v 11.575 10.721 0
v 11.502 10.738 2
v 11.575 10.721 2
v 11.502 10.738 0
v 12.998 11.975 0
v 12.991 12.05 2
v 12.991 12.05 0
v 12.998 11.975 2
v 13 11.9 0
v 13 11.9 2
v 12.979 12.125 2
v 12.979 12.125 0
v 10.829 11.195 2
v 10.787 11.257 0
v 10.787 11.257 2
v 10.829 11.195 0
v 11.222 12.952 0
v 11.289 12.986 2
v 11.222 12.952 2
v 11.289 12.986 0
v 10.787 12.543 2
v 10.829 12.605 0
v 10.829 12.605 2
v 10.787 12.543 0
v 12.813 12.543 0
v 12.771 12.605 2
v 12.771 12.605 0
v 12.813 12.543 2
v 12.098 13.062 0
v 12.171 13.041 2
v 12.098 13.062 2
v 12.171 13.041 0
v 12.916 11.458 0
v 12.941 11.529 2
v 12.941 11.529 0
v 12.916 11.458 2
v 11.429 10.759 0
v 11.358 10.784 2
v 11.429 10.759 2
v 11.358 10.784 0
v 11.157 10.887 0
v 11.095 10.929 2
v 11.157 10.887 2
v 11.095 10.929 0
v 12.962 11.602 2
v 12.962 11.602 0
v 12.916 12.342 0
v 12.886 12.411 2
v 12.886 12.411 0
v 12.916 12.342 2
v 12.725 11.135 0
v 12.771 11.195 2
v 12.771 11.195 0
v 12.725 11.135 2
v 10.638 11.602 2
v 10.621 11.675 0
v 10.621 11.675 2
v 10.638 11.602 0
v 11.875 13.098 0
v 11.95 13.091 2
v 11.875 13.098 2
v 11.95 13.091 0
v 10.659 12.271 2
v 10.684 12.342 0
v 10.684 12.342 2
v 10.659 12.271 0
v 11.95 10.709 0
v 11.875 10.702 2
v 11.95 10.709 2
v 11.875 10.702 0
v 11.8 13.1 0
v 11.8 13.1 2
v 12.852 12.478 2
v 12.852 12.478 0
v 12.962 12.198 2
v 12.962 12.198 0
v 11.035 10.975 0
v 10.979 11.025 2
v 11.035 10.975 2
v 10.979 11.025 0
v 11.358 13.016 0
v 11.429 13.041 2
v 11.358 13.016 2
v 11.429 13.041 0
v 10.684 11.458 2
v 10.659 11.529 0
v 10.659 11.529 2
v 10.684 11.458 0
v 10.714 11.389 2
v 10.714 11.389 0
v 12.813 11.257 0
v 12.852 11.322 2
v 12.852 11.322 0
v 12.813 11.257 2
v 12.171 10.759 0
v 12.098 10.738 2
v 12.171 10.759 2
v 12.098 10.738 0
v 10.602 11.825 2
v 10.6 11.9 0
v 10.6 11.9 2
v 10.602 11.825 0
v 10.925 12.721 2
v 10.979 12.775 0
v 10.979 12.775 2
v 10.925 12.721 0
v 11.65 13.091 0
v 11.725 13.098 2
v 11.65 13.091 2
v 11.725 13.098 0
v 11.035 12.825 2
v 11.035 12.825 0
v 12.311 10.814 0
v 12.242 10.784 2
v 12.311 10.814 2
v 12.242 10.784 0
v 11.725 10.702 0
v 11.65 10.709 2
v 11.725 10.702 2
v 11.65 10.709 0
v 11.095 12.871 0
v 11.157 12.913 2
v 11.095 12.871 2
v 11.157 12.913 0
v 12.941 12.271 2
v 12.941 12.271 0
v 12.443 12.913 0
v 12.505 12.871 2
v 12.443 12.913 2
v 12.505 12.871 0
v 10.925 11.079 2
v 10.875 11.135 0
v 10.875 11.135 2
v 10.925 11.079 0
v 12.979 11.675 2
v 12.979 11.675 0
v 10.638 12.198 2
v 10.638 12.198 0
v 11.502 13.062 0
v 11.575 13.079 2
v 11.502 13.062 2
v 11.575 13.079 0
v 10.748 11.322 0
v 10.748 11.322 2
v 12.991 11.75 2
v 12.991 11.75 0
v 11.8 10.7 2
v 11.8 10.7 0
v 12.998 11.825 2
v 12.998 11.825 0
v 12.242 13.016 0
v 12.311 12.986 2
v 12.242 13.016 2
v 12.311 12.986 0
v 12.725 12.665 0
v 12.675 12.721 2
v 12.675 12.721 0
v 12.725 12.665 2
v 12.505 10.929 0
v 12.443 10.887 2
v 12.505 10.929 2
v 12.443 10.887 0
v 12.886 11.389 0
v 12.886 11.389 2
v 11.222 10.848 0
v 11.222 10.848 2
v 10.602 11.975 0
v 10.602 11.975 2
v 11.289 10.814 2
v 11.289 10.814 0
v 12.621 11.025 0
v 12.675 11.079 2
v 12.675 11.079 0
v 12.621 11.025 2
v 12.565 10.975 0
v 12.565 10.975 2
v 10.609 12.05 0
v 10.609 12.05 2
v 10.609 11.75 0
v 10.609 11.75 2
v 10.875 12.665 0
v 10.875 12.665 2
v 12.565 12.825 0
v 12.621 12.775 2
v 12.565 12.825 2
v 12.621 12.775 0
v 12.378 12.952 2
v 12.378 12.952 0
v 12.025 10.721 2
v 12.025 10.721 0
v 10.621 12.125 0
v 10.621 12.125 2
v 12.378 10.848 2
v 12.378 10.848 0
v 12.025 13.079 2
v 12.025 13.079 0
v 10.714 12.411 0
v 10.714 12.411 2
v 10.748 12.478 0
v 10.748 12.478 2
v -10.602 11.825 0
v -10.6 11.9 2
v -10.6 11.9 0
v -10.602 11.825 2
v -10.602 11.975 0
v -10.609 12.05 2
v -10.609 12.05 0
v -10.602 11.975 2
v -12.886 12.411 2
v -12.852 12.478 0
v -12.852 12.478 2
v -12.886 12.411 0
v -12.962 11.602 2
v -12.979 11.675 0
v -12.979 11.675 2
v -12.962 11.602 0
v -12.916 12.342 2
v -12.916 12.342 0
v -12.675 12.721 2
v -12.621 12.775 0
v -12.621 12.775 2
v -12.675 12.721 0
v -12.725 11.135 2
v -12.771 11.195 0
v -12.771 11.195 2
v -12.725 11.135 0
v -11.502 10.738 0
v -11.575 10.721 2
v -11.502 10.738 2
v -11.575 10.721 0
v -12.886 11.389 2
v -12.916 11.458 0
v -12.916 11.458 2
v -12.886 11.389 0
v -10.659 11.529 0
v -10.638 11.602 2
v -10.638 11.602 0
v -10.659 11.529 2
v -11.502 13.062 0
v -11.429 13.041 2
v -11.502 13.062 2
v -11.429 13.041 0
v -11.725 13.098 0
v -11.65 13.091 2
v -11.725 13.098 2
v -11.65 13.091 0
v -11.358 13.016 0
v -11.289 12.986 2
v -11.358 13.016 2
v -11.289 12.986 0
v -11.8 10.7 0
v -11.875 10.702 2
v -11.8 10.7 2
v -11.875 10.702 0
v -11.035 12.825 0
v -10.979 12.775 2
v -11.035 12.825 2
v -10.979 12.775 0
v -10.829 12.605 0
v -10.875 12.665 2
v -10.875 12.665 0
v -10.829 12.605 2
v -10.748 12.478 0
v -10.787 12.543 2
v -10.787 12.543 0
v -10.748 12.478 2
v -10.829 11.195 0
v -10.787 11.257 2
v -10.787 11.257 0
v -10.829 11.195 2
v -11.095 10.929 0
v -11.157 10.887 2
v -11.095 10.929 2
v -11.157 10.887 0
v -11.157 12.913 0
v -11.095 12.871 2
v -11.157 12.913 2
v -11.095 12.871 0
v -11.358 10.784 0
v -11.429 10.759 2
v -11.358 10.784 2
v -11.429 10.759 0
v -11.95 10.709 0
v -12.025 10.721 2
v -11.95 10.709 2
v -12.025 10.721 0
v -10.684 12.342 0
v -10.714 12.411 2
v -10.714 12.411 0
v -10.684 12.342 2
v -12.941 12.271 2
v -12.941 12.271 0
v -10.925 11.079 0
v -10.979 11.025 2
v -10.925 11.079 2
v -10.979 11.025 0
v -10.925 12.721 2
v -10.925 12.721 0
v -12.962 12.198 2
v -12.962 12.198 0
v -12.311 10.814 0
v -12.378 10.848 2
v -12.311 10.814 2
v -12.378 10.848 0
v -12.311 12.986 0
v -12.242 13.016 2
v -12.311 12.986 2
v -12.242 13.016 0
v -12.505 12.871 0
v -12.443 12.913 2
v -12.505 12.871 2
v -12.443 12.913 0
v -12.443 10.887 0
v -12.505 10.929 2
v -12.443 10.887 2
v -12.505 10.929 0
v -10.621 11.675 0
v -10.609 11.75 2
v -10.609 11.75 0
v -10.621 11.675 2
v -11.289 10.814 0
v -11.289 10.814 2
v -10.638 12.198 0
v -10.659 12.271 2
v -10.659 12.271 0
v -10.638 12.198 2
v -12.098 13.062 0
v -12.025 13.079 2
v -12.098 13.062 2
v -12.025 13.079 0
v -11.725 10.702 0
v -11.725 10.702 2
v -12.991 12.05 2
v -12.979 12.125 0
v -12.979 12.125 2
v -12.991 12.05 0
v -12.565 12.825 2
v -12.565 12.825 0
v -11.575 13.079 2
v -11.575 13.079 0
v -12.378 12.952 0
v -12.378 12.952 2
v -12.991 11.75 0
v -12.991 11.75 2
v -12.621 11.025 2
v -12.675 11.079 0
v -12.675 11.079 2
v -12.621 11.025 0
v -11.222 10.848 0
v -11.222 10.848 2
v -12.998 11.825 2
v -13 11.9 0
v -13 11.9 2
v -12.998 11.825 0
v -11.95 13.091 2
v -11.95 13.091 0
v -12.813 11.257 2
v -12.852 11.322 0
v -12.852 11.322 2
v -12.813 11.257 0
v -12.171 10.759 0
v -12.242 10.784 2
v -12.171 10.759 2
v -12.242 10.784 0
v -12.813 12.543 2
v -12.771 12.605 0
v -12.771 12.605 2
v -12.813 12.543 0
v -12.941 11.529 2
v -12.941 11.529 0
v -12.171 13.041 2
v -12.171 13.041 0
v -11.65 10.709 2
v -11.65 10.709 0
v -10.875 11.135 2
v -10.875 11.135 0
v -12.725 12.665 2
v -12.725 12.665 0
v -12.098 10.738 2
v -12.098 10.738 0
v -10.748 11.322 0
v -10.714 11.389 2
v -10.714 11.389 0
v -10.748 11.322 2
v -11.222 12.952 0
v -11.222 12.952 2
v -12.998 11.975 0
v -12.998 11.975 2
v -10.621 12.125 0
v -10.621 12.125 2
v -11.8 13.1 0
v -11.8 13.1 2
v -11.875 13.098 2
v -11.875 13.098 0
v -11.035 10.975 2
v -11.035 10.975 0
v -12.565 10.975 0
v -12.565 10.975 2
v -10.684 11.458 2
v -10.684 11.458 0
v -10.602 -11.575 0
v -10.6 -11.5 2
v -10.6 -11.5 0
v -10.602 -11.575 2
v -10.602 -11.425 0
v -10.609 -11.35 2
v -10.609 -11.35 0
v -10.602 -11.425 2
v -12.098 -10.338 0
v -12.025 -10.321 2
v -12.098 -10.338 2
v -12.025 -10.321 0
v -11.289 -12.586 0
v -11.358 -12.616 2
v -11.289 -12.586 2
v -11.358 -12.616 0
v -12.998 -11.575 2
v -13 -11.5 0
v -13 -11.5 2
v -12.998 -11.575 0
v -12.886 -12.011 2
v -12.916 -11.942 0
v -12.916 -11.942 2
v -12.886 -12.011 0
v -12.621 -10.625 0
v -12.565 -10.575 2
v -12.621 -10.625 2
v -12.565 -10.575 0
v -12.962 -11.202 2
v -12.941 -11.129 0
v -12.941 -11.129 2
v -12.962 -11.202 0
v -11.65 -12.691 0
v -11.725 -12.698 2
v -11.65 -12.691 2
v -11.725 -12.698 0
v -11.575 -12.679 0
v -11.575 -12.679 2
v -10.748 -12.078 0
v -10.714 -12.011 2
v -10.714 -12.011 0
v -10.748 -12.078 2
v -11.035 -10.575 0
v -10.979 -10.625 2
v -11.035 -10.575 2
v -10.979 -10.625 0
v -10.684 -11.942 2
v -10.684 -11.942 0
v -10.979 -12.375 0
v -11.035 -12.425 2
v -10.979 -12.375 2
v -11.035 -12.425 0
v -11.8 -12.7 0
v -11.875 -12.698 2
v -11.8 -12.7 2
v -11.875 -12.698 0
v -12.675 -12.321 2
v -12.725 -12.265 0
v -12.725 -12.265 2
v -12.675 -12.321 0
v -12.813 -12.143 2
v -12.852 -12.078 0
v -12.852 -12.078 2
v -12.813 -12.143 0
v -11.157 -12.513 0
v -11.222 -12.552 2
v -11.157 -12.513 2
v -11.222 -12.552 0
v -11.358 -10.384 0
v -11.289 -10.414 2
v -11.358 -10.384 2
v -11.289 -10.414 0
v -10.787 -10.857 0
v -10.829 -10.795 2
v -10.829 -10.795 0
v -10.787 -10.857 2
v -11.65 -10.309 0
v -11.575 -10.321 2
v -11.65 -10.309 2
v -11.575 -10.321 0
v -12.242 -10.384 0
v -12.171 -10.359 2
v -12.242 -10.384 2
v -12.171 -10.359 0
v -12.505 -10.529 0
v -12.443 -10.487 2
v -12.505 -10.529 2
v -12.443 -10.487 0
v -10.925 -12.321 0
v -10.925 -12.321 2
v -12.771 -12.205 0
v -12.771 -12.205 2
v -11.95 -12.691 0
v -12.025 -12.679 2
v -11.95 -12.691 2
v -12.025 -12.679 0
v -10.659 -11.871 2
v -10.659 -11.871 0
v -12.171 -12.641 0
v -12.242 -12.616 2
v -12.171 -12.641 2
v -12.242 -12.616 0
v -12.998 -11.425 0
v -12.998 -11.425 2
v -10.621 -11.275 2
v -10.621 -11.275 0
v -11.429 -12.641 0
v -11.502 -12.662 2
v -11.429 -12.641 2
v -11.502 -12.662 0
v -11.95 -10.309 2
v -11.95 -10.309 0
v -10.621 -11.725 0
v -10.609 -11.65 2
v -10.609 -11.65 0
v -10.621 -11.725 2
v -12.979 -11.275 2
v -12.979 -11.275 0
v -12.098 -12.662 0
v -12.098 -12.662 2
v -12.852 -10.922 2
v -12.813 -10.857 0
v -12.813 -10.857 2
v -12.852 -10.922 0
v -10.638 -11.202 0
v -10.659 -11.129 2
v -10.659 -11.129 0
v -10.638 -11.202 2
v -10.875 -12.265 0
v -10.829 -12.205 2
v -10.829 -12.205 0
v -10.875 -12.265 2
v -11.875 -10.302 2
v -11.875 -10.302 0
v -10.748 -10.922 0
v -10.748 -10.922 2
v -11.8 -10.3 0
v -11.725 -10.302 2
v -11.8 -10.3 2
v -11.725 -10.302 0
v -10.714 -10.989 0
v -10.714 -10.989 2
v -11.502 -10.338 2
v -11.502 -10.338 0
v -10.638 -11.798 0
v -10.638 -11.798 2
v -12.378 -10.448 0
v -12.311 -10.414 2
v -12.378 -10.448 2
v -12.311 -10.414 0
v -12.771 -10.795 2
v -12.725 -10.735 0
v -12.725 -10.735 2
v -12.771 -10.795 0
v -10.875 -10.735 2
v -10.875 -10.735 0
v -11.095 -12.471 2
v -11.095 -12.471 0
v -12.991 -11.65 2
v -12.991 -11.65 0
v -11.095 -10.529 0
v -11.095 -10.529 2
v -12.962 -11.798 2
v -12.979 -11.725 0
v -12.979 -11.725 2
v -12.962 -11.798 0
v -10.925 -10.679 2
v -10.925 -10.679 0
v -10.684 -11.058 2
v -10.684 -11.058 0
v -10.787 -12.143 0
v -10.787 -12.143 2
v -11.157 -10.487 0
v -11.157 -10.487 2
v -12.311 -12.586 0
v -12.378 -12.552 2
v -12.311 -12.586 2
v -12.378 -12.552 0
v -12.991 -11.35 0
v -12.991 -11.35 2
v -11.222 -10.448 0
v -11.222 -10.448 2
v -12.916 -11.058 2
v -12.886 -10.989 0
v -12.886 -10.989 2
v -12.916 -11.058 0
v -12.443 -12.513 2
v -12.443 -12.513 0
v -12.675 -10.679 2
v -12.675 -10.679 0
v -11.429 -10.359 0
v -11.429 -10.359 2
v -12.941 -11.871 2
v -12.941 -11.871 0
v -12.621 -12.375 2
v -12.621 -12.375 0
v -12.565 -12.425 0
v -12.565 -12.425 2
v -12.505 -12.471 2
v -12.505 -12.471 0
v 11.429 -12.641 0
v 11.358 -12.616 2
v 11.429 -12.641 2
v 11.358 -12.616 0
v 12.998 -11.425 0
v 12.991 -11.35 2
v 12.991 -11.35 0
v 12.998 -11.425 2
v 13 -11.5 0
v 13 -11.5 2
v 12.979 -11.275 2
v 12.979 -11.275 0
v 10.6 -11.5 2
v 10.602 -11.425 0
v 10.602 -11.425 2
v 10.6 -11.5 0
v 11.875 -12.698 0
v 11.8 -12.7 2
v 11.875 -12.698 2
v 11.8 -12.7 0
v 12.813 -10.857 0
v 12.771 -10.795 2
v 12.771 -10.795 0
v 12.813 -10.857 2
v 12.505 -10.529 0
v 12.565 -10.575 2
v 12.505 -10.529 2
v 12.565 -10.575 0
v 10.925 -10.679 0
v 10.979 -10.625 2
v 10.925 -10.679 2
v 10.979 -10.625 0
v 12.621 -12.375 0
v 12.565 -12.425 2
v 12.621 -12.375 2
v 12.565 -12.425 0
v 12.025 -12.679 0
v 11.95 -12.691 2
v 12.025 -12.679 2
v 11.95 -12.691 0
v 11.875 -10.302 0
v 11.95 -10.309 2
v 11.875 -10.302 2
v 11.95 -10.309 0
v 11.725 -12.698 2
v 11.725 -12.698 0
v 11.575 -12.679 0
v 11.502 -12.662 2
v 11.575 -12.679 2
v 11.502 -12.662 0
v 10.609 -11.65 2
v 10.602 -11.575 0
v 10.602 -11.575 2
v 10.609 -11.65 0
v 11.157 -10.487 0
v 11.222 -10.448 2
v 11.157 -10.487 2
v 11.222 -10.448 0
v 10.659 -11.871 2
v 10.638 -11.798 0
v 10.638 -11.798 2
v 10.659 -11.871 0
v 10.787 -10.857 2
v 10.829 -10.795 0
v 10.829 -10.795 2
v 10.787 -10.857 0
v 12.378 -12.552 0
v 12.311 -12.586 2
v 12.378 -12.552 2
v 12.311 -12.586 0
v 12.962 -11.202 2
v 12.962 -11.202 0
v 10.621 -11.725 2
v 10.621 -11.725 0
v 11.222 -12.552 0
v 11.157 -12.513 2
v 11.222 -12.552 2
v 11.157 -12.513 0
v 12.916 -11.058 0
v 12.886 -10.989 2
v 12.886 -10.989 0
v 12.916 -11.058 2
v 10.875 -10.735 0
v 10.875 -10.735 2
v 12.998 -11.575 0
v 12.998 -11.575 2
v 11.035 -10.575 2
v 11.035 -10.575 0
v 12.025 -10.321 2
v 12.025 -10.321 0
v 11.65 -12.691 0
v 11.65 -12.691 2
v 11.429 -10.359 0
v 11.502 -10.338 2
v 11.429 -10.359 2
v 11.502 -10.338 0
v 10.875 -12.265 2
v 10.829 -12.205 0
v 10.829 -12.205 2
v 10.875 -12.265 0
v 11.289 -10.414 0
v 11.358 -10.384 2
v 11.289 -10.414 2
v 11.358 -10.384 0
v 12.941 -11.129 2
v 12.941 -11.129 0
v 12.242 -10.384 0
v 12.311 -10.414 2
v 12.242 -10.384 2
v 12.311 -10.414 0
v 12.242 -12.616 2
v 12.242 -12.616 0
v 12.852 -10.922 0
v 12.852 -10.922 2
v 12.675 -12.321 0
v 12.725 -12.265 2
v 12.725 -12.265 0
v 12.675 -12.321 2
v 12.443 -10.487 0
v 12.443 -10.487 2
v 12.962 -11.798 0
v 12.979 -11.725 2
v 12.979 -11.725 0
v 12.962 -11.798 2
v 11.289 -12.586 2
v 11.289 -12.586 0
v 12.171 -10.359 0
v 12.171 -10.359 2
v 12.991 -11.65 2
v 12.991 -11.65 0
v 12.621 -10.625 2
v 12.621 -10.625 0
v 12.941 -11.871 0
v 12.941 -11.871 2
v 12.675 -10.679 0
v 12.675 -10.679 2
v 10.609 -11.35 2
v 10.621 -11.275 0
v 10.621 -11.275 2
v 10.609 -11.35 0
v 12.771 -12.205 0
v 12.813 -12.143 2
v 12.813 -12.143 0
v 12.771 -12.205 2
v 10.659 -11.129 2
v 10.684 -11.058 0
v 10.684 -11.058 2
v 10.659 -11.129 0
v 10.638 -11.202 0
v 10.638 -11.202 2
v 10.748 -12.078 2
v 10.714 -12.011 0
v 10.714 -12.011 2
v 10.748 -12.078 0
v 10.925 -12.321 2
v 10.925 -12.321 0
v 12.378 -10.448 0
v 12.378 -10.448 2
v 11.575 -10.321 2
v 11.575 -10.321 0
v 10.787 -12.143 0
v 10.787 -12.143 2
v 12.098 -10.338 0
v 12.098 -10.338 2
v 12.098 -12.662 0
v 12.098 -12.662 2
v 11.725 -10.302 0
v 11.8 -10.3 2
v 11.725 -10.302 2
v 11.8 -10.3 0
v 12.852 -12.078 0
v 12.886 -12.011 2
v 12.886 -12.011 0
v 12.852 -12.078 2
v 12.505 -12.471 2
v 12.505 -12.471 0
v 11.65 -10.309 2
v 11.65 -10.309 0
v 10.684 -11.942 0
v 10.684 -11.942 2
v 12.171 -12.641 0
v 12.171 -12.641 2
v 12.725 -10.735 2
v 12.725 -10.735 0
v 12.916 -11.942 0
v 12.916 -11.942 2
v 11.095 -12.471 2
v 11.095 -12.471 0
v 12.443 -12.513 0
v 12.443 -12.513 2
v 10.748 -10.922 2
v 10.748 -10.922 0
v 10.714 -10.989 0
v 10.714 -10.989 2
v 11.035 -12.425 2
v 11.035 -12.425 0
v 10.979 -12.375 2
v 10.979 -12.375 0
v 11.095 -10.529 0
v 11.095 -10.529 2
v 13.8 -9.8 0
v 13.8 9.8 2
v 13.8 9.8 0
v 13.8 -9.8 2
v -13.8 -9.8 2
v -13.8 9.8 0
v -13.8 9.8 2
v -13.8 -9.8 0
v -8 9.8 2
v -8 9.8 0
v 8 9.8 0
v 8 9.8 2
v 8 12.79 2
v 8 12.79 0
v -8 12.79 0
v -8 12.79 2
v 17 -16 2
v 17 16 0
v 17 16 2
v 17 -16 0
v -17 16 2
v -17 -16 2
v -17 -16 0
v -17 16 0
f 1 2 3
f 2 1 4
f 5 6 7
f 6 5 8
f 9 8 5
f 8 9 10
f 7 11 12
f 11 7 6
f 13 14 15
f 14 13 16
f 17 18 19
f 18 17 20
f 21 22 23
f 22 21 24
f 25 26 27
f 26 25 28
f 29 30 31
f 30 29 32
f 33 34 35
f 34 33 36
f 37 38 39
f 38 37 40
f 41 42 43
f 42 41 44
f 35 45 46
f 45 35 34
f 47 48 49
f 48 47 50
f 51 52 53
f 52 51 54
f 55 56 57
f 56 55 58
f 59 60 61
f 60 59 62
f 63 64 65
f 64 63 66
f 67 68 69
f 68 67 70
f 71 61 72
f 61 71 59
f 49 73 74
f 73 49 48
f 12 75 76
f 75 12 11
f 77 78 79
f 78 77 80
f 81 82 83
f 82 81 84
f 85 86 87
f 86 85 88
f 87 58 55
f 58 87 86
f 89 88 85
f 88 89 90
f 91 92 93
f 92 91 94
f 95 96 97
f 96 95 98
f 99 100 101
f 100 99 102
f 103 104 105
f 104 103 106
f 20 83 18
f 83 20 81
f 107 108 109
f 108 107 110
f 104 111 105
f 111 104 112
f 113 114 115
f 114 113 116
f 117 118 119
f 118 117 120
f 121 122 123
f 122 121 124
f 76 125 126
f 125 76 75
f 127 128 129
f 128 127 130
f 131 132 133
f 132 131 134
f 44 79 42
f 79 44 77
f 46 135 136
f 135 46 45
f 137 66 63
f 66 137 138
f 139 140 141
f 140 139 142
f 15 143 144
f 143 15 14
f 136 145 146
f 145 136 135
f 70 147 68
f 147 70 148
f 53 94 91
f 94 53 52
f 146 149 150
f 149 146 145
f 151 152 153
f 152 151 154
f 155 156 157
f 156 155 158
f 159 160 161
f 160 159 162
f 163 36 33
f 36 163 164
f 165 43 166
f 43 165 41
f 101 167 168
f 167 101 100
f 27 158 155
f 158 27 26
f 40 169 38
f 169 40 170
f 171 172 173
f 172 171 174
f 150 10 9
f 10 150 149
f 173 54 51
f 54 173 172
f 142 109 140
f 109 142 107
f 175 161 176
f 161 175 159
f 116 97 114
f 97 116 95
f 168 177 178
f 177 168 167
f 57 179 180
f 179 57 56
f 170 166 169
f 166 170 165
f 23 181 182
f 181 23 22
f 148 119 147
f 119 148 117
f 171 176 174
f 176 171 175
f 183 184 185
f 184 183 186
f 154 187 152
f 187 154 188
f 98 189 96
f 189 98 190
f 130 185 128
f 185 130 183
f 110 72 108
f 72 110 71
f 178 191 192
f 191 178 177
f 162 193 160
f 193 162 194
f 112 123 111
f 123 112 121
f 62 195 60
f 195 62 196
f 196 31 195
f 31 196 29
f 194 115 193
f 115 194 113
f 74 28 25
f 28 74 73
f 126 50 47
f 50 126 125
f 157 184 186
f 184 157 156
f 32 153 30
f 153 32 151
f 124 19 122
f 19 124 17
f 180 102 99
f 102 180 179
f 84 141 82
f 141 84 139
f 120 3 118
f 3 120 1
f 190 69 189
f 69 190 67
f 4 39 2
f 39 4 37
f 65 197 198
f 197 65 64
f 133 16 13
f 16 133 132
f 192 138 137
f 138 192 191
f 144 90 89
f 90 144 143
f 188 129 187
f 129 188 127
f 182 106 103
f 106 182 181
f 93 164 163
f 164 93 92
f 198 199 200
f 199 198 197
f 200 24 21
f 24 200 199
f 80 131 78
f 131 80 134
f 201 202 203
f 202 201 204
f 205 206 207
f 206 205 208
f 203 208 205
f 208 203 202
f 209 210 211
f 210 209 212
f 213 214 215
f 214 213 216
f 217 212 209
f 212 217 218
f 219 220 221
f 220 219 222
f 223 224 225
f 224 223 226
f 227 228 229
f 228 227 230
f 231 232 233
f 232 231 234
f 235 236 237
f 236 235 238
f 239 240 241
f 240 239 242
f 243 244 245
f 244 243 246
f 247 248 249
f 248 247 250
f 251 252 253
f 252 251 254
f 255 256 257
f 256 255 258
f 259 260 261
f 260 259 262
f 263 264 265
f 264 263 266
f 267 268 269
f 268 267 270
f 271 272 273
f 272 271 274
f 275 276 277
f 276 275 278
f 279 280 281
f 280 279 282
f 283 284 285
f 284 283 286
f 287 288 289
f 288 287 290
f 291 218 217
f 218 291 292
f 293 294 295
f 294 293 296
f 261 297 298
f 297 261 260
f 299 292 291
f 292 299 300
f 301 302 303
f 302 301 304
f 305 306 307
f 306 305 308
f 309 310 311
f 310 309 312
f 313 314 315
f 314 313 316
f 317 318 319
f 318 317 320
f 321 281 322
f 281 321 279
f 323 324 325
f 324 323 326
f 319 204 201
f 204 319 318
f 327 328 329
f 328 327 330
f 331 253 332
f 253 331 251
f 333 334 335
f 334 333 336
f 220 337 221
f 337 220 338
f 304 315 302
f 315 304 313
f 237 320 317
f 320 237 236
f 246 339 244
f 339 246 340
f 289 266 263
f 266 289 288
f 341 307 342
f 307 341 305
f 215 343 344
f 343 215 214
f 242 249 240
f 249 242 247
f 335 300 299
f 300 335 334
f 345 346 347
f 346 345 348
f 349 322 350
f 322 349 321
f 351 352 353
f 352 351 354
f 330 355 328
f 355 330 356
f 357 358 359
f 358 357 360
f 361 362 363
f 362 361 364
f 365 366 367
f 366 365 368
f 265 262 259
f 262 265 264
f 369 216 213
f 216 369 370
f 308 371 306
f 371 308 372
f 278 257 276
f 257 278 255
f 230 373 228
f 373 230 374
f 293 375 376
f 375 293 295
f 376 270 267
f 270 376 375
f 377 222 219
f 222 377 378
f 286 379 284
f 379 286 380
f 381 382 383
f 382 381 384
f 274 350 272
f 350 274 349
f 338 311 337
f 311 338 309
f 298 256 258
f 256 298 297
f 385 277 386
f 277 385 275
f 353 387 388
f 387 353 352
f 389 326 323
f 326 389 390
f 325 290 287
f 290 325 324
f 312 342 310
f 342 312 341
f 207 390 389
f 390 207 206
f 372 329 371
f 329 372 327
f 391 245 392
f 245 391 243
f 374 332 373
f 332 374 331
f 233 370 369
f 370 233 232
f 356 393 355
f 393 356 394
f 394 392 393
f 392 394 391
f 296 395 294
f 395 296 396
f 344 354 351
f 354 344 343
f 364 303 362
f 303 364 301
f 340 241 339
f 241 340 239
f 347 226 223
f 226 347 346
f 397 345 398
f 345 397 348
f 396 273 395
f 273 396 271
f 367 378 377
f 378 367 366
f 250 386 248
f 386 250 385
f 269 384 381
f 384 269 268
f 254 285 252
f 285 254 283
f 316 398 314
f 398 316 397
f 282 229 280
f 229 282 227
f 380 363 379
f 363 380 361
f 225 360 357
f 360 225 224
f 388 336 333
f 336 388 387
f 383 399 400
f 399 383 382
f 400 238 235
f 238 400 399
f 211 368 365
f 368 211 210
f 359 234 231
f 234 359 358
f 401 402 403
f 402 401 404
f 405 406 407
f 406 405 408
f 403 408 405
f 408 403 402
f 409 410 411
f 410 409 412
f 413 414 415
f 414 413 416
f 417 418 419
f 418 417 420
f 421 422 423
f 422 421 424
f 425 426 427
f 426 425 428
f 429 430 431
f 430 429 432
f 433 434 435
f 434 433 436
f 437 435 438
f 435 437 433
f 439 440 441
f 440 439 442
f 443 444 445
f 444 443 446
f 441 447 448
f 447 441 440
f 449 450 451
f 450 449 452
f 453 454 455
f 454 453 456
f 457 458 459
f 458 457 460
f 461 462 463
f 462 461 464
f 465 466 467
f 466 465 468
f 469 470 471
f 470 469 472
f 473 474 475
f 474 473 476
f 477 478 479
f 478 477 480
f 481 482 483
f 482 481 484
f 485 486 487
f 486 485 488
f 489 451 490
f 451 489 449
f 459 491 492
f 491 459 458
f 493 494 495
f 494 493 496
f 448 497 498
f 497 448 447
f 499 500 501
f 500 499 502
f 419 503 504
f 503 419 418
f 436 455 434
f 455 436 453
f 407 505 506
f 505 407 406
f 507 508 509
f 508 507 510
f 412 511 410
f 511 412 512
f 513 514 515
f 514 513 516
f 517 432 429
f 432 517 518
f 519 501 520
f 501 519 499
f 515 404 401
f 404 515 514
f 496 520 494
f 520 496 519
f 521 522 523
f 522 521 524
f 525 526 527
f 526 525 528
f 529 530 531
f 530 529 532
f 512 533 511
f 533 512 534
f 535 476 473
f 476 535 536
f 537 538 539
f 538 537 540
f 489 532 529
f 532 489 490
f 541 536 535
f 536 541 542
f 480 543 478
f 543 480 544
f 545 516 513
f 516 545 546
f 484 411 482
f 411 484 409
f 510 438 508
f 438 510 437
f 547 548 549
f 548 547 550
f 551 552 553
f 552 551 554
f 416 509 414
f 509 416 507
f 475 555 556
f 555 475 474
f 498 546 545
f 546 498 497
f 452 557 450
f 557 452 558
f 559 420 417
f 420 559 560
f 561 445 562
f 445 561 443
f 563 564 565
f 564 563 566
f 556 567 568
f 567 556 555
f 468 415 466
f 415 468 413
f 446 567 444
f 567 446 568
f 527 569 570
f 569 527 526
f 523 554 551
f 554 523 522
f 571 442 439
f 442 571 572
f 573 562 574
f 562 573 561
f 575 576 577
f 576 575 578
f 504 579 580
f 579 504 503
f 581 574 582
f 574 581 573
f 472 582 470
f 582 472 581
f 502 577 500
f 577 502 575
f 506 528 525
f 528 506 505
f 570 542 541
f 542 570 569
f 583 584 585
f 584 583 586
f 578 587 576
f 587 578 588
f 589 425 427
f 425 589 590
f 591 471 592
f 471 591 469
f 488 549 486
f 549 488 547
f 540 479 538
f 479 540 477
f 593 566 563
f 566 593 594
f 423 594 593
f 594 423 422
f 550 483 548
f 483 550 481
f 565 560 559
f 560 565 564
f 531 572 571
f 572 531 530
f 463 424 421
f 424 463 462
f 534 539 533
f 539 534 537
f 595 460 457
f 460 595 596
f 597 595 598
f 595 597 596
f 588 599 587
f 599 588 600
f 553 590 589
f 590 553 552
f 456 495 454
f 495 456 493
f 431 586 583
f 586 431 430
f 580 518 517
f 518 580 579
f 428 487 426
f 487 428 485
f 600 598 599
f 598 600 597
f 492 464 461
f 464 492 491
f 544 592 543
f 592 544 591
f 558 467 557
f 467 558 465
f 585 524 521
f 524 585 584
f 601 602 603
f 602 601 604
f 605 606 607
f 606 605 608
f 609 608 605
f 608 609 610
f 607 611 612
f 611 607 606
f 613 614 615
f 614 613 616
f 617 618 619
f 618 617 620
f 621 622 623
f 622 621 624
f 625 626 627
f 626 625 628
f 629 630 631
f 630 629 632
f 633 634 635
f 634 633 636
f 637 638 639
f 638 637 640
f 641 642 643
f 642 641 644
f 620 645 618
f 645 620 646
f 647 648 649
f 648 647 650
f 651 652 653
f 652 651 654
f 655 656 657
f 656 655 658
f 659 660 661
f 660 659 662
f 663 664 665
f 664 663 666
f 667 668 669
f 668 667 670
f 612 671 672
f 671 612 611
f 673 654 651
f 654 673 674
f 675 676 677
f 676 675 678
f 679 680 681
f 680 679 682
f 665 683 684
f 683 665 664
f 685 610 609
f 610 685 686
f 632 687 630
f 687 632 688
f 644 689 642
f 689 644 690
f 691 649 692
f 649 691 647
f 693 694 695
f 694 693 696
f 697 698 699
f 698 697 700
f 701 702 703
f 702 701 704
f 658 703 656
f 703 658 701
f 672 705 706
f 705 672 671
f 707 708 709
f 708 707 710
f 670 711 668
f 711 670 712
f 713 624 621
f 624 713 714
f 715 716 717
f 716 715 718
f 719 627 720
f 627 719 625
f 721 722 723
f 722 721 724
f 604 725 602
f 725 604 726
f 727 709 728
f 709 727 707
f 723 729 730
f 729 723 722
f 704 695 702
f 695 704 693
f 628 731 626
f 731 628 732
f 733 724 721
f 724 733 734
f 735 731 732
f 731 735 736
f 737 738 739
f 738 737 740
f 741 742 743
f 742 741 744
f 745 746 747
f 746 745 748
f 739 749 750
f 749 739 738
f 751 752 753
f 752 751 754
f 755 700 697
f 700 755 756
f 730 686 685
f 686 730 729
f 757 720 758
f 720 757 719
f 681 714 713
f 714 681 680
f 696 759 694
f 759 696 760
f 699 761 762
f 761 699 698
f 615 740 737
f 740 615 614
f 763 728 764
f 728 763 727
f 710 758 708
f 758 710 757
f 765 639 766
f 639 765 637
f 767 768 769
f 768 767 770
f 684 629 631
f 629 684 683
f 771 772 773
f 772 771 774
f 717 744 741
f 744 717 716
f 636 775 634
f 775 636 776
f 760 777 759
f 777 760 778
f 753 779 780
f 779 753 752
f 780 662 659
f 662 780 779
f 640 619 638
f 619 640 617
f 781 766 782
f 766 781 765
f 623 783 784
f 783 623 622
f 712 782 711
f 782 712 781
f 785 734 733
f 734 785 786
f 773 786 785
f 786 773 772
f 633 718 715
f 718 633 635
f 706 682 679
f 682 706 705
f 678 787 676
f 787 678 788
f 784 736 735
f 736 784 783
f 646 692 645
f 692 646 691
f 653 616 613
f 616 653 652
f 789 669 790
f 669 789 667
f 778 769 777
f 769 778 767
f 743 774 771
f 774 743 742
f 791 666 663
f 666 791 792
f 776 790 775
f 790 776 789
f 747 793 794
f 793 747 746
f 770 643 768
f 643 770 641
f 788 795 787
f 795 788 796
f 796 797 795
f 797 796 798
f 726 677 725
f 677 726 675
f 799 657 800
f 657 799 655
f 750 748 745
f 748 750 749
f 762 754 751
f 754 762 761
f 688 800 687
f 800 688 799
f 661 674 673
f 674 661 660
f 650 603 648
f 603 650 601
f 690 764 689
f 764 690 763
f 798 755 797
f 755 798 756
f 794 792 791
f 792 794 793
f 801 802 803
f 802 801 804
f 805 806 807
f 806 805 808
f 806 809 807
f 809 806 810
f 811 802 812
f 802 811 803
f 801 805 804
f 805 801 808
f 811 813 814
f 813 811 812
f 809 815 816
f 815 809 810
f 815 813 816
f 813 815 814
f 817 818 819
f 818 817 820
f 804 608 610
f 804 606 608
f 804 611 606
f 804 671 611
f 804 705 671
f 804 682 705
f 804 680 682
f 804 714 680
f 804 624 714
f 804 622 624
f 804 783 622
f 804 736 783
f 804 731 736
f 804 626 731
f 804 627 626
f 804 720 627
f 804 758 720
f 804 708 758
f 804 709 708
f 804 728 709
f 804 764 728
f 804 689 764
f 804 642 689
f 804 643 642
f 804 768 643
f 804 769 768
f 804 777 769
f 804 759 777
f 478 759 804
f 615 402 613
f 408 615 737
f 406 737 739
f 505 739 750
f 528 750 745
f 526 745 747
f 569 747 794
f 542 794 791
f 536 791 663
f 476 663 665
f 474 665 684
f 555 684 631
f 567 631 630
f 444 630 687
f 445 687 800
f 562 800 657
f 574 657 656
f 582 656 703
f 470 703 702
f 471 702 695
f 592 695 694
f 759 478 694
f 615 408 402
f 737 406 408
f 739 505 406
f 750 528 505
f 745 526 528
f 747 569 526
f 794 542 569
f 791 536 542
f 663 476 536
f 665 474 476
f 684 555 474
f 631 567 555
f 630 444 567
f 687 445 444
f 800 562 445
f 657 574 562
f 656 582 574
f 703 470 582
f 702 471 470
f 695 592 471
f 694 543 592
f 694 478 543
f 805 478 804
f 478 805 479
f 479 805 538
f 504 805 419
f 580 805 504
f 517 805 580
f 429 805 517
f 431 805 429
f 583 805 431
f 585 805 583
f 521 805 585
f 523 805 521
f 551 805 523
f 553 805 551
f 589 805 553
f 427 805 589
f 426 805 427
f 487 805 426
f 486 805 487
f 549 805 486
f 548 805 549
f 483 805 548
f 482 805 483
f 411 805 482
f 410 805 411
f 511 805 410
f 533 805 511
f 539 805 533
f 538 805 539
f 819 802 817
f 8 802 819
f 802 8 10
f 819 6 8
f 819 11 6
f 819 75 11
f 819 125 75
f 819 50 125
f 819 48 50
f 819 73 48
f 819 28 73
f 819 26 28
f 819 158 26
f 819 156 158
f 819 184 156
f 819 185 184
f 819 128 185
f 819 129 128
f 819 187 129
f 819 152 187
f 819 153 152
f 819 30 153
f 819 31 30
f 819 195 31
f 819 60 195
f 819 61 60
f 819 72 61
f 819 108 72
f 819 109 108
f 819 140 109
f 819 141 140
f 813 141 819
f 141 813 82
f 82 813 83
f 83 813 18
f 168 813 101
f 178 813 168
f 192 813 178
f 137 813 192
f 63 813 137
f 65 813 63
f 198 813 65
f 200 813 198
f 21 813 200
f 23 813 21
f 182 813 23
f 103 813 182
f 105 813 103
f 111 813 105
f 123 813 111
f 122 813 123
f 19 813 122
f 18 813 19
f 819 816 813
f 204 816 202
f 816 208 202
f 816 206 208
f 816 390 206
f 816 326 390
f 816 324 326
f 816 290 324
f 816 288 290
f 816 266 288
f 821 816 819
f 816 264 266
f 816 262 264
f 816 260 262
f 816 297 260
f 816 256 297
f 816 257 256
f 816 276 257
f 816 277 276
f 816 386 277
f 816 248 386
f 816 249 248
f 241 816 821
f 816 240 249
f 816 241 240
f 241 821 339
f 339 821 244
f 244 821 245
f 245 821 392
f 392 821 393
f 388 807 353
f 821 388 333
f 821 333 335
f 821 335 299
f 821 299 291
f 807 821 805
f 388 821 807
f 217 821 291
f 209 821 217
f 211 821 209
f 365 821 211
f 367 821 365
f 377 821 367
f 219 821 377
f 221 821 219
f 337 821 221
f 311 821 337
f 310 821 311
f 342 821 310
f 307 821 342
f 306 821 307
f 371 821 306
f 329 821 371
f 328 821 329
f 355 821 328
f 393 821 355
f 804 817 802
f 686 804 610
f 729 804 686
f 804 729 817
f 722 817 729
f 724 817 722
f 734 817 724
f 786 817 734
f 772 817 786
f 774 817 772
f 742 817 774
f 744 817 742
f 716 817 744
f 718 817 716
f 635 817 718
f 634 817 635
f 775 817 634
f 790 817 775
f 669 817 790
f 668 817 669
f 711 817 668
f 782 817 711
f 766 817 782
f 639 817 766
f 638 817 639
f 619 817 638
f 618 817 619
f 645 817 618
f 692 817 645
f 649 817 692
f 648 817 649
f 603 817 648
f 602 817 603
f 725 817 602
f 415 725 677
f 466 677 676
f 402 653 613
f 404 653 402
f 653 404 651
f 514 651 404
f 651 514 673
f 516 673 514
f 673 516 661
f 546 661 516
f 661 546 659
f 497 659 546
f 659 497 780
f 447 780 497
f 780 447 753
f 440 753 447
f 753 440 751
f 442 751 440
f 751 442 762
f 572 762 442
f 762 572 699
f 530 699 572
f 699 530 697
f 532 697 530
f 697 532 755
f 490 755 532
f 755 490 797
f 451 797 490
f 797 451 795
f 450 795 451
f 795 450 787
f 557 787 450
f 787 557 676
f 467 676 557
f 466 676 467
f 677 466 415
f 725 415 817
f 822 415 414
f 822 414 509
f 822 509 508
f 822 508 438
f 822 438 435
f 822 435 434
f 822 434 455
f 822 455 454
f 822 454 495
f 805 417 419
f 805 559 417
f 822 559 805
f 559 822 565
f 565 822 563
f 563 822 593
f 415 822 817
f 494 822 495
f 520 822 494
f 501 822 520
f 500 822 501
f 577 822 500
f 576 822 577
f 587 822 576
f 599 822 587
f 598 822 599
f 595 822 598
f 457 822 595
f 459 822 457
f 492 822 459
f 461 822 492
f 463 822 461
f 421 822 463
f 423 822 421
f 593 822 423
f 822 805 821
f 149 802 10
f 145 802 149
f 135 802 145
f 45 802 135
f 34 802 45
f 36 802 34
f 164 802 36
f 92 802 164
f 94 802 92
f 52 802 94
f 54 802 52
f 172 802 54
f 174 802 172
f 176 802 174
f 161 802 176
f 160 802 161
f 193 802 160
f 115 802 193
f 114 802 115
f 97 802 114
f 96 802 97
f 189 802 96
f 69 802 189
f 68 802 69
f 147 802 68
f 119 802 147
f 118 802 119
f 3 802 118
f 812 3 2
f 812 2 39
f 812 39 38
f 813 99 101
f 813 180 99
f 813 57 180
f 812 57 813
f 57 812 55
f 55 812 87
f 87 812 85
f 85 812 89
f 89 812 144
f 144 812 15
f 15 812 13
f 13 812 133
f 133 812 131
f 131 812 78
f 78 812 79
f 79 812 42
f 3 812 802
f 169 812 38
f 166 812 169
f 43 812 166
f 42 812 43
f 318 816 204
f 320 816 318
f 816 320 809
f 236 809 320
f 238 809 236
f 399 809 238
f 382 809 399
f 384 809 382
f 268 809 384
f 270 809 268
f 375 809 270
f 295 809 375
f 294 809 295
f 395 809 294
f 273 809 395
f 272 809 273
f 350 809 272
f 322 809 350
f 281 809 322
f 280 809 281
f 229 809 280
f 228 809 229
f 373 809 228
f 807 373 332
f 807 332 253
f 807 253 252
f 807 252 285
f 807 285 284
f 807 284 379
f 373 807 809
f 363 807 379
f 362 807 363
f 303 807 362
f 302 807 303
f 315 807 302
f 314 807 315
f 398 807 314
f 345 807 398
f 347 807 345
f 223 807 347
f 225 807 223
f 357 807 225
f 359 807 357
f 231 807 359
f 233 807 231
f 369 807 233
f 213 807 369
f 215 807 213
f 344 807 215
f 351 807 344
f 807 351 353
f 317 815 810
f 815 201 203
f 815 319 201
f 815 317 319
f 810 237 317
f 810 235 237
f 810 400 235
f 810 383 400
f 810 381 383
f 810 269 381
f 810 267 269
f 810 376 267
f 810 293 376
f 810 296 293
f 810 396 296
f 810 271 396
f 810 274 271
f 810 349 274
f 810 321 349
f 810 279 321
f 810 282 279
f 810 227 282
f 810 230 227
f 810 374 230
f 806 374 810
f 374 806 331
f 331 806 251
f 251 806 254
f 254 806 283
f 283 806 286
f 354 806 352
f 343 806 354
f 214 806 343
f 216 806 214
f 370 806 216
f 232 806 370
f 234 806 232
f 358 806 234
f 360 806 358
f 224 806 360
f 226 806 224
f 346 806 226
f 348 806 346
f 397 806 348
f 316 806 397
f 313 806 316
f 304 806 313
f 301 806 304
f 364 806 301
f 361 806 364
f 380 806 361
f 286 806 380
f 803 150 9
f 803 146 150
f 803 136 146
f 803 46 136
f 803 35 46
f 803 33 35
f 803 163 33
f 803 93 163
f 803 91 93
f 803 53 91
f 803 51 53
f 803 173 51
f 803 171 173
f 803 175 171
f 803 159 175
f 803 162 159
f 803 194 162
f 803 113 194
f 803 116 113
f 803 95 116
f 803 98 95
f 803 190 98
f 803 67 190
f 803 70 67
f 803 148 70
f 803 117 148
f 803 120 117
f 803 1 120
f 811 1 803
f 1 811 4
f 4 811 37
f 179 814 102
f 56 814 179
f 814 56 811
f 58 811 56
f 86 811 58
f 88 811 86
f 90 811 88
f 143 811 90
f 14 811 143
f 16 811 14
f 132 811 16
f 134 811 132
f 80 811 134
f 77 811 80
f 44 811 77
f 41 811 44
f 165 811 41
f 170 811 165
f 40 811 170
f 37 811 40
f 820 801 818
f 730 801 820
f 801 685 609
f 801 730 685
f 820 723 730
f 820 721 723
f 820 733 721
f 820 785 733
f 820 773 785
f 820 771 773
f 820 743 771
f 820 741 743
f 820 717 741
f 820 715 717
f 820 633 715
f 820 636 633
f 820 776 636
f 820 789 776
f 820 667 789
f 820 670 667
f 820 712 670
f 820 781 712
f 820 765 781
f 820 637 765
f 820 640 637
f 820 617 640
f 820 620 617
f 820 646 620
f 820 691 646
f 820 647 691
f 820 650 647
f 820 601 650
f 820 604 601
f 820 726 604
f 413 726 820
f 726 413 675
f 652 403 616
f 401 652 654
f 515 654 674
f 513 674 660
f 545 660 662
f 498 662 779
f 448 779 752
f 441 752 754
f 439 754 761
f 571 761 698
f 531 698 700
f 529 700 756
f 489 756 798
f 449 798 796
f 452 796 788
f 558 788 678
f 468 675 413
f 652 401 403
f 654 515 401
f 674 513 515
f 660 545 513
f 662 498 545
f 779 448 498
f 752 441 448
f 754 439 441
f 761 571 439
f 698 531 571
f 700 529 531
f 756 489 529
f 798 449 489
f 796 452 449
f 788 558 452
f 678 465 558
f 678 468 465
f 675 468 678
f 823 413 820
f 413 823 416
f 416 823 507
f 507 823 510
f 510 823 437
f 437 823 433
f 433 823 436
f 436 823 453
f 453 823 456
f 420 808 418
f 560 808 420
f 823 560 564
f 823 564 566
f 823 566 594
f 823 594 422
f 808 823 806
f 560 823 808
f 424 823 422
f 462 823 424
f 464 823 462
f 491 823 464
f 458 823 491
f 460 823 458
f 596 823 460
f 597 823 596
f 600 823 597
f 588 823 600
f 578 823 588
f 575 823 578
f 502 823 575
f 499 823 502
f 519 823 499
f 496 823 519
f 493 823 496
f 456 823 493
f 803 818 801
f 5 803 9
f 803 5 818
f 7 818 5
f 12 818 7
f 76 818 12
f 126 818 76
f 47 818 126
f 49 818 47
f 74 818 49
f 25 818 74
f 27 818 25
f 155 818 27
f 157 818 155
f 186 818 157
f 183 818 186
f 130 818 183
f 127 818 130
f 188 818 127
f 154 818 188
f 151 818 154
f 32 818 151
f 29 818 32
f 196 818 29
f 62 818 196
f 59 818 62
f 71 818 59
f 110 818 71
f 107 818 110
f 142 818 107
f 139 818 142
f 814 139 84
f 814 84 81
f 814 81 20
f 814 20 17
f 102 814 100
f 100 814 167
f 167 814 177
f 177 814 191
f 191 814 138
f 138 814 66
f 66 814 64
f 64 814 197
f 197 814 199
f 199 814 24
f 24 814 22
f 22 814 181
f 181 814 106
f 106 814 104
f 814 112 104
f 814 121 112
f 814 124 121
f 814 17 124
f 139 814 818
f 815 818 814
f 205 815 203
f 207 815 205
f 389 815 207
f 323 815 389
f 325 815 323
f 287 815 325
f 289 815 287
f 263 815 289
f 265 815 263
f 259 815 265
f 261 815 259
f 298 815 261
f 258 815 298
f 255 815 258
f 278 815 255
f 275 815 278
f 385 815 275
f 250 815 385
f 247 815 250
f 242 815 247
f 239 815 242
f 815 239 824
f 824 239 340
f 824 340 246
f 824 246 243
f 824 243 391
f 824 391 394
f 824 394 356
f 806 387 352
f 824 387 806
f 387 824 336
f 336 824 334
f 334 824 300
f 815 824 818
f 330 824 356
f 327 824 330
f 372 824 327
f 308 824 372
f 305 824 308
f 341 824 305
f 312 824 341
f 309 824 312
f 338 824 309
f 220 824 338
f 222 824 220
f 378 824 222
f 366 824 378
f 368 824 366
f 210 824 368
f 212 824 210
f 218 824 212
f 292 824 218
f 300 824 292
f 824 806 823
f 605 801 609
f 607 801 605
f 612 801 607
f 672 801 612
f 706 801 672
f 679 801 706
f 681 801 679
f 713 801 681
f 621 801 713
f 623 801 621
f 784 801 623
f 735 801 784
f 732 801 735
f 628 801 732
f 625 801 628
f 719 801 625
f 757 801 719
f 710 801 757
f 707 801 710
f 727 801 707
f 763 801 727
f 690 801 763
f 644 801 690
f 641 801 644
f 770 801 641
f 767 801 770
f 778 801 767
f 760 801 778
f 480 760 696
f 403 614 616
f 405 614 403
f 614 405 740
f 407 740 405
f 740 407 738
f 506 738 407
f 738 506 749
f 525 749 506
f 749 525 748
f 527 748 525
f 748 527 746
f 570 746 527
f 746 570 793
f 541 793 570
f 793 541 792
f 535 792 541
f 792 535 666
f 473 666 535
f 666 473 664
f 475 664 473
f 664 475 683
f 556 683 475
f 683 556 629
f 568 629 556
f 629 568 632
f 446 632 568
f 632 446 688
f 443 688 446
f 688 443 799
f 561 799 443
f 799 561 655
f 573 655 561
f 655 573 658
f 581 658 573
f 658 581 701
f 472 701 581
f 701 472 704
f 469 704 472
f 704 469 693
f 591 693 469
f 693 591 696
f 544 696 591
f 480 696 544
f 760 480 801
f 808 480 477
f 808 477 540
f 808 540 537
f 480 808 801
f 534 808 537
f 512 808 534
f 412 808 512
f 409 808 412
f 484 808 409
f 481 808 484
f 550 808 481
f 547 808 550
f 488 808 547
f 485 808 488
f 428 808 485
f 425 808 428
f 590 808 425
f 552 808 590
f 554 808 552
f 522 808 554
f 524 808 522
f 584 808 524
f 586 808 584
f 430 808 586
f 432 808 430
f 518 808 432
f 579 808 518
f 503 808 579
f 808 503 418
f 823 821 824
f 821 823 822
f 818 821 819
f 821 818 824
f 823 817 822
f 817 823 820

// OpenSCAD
/* [Options] */

draw_panel=1;//[0:No, 1:Yes]
draw_faceplate=0;//[0:No, 1:Yes]
draw_oled_extrusions=0;//[0:No, 1:Yes]

/* [Hidden] */
$fn = 100;

panel_width = 34;
panel_length = 32;
panel_thickness = 2.0;

extrude_height = 6;

screw_diameter = 2.4;
oled_screw_hole_spacing_x = 23.6;
oled_screw_hole_spacing_y = 23.0;

oled_screen_width = 27.6;
oled_screen_length = 19.6;
oled_screen_x_offset = 0;
oled_screen_y_offset = 0;

faceplate_width = panel_width - 4.0;
faceplate_length = panel_length - 4.0;
faceplate_cutout_width = oled_screen_width - 4.0;
faceplate_cutout_length = 12.0;
faceplate_cutout_y_offset = -8;
faceplate_thickness = 1.0; 

module screw_hole_cutouts() {
    screw_hole_x_offset = oled_screw_hole_spacing_x/2;
    screw_hole_y_offset = oled_screw_hole_spacing_y/2;
    screw_hole_bottom_y_offset = 0.4;

    color("red") {
        translate([screw_hole_x_offset, screw_hole_y_offset + screw_hole_bottom_y_offset, -extrude_height/2]) 
        cylinder(h=extrude_height, d = screw_diameter);

        translate([-screw_hole_x_offset, screw_hole_y_offset + screw_hole_bottom_y_offset, -extrude_height/2]) 
        cylinder(h=extrude_height, d = screw_diameter);    

        translate([-screw_hole_x_offset, -screw_hole_y_offset, -extrude_height/2]) 
        cylinder(h=extrude_height, d = screw_diameter);        

        translate([screw_hole_x_offset, -screw_hole_y_offset, -extrude_height/2]) 
        cylinder(h=extrude_height, d = screw_diameter);
    }    
}

module oled_display_cutouts() {
    notch_width = 16.0;
    notch_length = 3.0;
    notch_y_offset = 0.01;

    // screen cutout
    translate([-oled_screen_width/2 + oled_screen_x_offset, -oled_screen_length/2 + oled_screen_y_offset, -extrude_height/2]) 
    color("purple")
    cube([oled_screen_width, oled_screen_length, extrude_height]);

    // notch for screen ribbon cable
    translate([-notch_width/2 + oled_screen_x_offset, oled_screen_length/2 + oled_screen_y_offset - notch_y_offset, -extrude_height/2])     
    color("green")
    cube([notch_width, notch_length, extrude_height]);

    screw_hole_cutouts();
}

module faceplate_cutouts() {
    translate([-faceplate_cutout_width/2, faceplate_cutout_y_offset, -extrude_height/2])     
    color("purple")
    cube([faceplate_cutout_width, faceplate_cutout_length, extrude_height]);    

    screw_hole_cutouts();
}

module panel() {
    translate([-panel_width/2, -panel_length/2, 0])
    cube([panel_width, panel_length, panel_thickness]);
}

module faceplate() {
    color("gray") {
        translate([-faceplate_width/2, -faceplate_length/2, -panel_thickness + faceplate_thickness])
        cube([faceplate_width, faceplate_length, faceplate_thickness]);
    }
}

if (draw_oled_extrusions == 1) {
    oled_display_cutouts();
} 
else {
    if (draw_panel == 1) {
        difference()
        {
            panel();
            oled_display_cutouts();
        }
    }

    if (draw_faceplate == 1) {
        difference() {
            faceplate();
            faceplate_cutouts();
        }
    }

    if (draw_oled_extrusions == 1) {
        oled_display_cutouts();
    }
}
